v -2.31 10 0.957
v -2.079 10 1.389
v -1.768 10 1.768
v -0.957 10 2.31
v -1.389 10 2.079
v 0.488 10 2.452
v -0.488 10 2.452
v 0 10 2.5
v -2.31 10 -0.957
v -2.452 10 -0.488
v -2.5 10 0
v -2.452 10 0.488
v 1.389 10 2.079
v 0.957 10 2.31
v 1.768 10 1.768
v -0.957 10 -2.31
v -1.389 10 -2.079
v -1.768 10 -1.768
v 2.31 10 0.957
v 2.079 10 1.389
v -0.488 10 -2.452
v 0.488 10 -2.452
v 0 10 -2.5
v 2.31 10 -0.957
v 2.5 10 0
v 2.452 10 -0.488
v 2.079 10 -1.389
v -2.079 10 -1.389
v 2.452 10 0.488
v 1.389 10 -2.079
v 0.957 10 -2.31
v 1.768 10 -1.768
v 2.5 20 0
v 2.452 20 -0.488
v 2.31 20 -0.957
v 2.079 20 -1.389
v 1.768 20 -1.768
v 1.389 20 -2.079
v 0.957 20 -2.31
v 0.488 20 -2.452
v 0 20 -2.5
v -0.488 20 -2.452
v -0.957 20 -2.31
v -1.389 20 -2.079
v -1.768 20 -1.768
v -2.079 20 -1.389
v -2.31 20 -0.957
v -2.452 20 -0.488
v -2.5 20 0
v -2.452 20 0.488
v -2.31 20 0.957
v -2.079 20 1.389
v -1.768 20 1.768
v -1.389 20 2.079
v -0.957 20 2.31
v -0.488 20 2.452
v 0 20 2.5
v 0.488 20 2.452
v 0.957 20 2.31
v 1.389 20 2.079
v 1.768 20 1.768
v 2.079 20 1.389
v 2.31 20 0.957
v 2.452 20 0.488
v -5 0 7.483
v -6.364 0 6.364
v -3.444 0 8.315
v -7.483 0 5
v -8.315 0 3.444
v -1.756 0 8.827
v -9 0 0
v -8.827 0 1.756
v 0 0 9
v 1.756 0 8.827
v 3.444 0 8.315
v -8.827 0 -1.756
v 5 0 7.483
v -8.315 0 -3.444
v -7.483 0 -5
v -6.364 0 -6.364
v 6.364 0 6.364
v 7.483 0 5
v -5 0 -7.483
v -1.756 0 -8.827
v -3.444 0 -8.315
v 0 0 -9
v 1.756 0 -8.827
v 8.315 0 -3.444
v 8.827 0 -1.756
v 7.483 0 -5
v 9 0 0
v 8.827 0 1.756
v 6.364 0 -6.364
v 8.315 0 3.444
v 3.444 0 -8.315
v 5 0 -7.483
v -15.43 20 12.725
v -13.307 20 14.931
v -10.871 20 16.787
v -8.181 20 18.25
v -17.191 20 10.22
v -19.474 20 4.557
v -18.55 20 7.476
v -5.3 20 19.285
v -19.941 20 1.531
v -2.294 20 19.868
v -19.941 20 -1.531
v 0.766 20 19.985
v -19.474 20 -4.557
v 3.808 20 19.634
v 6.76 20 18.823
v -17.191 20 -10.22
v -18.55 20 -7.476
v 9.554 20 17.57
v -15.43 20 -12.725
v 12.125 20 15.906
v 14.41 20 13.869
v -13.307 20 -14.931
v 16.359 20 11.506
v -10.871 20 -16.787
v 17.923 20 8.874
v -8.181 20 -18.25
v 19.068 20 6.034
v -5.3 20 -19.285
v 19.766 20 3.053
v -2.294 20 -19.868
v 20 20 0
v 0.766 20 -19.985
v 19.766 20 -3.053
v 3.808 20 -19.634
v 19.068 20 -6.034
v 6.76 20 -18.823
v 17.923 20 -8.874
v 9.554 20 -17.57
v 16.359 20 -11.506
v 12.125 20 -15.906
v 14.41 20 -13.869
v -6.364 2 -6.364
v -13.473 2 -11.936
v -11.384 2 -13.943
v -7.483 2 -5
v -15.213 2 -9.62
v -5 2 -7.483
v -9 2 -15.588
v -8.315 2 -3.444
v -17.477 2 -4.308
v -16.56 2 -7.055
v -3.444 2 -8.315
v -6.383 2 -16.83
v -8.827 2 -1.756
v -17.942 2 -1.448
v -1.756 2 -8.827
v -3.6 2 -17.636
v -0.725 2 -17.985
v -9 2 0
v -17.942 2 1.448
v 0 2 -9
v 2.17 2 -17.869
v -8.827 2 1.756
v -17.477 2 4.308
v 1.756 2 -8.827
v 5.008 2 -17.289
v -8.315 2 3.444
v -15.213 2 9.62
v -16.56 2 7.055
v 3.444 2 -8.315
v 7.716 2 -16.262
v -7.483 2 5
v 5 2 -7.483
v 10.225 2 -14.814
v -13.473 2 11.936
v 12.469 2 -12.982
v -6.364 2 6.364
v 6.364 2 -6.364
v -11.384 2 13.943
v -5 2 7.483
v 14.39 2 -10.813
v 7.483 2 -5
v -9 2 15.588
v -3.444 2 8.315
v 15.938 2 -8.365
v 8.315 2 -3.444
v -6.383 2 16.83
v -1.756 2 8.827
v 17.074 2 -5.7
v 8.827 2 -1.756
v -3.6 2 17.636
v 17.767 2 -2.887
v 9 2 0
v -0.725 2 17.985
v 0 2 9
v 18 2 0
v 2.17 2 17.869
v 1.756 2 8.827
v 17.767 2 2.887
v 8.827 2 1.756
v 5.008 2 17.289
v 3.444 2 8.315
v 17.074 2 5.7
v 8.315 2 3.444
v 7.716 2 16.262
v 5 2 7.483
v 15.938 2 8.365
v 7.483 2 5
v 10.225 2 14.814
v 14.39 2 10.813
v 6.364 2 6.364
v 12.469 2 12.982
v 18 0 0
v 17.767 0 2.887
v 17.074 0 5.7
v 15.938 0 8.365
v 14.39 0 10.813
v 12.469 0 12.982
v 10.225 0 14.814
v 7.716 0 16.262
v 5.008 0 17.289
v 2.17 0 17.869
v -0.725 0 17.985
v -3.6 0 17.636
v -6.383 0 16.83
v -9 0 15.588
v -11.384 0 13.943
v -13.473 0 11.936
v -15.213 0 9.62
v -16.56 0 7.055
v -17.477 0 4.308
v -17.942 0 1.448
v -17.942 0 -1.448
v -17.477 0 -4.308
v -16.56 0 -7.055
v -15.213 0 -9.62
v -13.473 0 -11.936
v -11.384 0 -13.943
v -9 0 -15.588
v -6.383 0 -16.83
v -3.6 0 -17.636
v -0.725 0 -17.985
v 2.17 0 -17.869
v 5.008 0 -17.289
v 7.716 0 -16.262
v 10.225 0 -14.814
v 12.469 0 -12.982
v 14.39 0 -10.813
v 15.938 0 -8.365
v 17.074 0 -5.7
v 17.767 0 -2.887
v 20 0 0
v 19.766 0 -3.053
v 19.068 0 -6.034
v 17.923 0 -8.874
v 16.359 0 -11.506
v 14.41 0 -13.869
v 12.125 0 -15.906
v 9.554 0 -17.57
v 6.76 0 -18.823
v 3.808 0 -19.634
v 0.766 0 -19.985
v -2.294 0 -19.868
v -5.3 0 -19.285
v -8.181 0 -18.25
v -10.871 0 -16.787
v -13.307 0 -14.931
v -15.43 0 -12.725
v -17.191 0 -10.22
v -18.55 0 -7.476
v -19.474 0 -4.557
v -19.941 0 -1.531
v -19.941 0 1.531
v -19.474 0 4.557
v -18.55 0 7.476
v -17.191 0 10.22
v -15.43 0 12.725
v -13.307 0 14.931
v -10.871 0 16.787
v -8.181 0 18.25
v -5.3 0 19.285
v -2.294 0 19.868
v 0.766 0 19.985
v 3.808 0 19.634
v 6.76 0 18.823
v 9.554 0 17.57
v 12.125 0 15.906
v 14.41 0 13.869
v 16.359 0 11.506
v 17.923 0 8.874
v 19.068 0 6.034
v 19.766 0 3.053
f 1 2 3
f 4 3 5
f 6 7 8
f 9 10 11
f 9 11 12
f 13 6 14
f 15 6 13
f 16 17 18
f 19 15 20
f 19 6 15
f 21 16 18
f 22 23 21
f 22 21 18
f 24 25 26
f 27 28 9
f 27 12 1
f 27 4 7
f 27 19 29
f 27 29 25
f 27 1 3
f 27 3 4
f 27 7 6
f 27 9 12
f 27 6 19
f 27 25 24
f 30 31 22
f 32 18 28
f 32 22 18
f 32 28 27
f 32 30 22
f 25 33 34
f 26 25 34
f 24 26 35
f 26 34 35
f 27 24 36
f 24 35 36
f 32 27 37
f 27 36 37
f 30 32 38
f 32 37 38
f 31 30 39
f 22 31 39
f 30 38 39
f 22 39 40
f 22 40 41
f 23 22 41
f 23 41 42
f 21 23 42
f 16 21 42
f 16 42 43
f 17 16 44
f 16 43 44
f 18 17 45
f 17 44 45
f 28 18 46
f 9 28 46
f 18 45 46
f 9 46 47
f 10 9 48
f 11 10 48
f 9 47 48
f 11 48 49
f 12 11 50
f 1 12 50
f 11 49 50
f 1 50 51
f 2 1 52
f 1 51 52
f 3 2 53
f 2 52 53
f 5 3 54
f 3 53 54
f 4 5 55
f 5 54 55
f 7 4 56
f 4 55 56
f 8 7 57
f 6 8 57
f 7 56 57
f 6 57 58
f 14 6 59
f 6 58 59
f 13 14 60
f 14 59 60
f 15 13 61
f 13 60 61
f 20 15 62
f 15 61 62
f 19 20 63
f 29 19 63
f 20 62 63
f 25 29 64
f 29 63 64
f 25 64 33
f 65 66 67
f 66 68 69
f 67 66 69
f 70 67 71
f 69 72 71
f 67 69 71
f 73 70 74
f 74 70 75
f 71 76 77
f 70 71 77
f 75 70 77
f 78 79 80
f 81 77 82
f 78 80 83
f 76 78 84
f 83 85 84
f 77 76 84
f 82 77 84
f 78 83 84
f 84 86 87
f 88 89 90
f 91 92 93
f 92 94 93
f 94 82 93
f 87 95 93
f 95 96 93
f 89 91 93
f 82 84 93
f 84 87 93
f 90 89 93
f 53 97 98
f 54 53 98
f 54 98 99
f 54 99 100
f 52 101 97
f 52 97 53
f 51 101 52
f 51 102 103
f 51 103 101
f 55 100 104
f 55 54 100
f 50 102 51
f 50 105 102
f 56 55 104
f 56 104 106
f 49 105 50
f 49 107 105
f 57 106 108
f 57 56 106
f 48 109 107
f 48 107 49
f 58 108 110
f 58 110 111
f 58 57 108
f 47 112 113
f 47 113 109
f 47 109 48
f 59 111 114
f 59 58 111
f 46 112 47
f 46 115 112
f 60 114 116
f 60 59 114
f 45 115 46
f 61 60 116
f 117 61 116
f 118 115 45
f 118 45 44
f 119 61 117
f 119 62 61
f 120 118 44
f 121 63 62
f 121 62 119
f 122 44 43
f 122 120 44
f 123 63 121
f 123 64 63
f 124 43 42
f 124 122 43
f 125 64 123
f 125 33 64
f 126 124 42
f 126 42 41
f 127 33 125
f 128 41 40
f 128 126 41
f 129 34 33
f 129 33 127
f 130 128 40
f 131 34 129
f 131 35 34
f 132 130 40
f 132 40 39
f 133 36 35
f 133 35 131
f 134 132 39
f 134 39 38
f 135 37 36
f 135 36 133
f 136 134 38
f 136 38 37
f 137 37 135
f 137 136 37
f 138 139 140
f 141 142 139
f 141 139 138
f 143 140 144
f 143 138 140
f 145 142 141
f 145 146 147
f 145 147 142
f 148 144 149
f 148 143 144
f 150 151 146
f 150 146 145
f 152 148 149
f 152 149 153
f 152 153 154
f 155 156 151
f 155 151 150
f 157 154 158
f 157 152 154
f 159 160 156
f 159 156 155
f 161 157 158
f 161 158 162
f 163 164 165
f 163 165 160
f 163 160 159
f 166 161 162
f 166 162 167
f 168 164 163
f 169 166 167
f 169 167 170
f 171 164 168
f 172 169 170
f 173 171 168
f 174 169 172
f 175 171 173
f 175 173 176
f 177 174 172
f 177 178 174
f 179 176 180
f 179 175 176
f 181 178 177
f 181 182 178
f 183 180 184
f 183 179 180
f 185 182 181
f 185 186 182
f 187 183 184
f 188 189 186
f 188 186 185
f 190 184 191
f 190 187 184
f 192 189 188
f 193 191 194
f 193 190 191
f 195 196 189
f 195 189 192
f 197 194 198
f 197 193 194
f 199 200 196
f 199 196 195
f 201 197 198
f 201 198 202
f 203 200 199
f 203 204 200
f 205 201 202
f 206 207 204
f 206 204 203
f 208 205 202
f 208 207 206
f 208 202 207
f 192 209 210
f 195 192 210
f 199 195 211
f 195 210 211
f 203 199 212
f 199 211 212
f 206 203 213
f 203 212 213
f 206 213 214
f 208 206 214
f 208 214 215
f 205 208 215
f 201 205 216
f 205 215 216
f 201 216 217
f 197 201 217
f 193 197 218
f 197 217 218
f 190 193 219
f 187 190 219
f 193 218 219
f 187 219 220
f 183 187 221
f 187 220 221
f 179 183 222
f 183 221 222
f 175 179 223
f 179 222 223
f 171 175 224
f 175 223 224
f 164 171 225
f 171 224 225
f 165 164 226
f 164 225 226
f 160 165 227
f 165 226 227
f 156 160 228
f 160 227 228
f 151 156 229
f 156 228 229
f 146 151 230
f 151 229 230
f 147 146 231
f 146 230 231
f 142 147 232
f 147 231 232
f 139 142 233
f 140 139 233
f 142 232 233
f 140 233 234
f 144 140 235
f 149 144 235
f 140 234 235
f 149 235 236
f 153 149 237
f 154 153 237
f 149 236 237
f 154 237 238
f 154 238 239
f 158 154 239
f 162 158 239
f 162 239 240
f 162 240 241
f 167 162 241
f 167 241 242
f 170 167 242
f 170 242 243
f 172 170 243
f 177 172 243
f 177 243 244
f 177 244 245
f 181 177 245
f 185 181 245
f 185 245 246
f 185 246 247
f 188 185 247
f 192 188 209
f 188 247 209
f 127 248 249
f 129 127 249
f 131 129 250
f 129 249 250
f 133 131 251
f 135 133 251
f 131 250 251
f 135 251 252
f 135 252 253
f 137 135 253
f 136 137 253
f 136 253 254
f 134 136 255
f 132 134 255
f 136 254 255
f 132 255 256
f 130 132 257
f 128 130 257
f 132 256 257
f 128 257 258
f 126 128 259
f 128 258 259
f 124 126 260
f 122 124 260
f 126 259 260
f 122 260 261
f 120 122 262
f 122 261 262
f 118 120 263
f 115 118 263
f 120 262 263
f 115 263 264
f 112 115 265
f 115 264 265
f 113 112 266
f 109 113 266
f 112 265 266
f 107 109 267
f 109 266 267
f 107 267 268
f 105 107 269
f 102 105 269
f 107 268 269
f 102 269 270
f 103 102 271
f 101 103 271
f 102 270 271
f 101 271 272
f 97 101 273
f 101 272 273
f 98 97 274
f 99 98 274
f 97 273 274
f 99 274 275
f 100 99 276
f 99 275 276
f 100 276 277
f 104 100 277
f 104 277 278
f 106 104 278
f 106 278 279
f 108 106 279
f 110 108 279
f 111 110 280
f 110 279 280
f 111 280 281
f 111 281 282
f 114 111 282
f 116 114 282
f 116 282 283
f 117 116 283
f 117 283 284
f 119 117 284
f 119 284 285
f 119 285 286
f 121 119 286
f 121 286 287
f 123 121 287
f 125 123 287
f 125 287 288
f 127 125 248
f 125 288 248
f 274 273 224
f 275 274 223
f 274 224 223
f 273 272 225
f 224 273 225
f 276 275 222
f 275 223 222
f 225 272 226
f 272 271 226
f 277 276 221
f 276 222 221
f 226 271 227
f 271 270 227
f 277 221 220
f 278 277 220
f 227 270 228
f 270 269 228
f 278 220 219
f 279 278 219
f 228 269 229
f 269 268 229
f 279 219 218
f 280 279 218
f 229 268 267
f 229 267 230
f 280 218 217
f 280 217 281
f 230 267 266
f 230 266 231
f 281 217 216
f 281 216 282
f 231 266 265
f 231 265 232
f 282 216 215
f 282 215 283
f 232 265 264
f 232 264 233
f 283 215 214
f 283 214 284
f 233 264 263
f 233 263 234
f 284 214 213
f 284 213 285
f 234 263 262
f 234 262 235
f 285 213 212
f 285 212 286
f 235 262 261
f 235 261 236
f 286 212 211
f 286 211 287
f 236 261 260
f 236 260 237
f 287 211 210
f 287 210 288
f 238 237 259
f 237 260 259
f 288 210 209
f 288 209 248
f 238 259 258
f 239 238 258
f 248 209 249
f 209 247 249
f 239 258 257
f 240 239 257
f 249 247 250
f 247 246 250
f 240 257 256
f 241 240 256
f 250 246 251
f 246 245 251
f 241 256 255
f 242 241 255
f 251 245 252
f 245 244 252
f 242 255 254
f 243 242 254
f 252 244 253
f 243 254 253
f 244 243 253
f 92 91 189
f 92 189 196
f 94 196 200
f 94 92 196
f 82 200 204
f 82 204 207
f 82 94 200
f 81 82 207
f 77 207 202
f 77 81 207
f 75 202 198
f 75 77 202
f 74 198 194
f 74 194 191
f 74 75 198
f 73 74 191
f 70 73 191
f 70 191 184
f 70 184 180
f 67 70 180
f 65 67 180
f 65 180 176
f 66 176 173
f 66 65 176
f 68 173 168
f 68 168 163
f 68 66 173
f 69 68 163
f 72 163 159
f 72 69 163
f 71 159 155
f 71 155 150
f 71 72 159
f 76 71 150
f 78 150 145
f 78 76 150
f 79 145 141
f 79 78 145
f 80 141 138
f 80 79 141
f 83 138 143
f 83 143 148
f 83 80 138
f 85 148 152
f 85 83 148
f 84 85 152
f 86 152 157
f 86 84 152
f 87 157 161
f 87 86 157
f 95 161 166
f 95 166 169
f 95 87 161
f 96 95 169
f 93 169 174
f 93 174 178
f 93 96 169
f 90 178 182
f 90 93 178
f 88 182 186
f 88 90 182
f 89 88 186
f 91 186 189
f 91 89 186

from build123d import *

# Parameters (mm, degrees)
SKETCH_1_R          = 20
EXTRUDE_1_DEPTH     = 20
SKETCH_2_R          = 2.5
CUT_EXTRUDE_1_DEPTH = 10
SKETCH_3_R          = 18
SKETCH_3_R_2        = 9
CUT_EXTRUDE_2_DEPTH = 2


with BuildPart() as part:
    # 草图1 → 凸台-拉伸1 (new body)
    with BuildSketch(Plane(origin=(0, 0, 0), x_dir=(1, 0, 0), z_dir=(0, 1, 0))):
        Circle(SKETCH_1_R)
    extrude(amount=EXTRUDE_1_DEPTH)

    # 草图2 → 切除-拉伸1 (cut)
    with BuildSketch(Plane(origin=(0, 20, 0), x_dir=(1, 0, 0), z_dir=(0, 1, 0))):
        Circle(SKETCH_2_R)
    extrude(amount=-CUT_EXTRUDE_1_DEPTH, mode=Mode.SUBTRACT)

    # 草图3 → 切除-拉伸2 (cut)
    with BuildSketch(Plane.XZ):
        Circle(SKETCH_3_R)
        Circle(SKETCH_3_R_2, mode=Mode.SUBTRACT)
    extrude(amount=-CUT_EXTRUDE_2_DEPTH, mode=Mode.SUBTRACT)


solid = part.part
